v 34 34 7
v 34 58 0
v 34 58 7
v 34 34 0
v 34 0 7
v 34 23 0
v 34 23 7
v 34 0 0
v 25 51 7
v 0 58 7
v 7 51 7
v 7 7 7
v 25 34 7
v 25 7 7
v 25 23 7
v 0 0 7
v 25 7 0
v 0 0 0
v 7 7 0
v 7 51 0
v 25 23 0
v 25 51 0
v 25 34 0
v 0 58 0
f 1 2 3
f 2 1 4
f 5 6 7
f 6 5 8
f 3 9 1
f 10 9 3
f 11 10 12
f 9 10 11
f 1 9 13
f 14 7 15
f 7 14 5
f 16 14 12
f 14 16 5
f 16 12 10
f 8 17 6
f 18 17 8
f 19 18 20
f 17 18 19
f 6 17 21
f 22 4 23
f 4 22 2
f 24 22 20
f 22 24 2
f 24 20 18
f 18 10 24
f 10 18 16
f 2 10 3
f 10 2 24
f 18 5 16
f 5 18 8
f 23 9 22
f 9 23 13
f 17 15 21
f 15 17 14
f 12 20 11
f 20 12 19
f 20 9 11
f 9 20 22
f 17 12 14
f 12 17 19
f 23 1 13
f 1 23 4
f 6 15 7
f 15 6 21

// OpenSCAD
jaw_depth     = 20;
jaw_thickness = 7;
jaw_spacing   = 44;//16.16;
// tooth_height  = 7.75; //.75;

module planter_clip()
{
  // Calculated Values
  body_length = jaw_depth + (jaw_thickness * 2);
  body_width  = jaw_spacing + (jaw_thickness * 2);

  mouth_width = jaw_spacing /4;
  mouth_x_pos = jaw_depth + jaw_thickness;
  mouth_y_pos = body_length/2;//jaw_thickness + tooth_height;

    box_main = [body_length, body_width, jaw_thickness];
    box_cutout = [jaw_depth-2, jaw_spacing, jaw_thickness + 2];
    box_slit = [jaw_thickness + 4, mouth_width, jaw_thickness + 2];
    
    move_cutout = [jaw_thickness, jaw_thickness, -1];
    move_slit= [mouth_x_pos - 3, mouth_y_pos+6, -1];
    
    difference()
    {
        cube(box_main);
        
        translate(move_cutout) cube(box_cutout);
        
        #translate(move_slit) cube(box_slit);
    }
}

planter_clip();
